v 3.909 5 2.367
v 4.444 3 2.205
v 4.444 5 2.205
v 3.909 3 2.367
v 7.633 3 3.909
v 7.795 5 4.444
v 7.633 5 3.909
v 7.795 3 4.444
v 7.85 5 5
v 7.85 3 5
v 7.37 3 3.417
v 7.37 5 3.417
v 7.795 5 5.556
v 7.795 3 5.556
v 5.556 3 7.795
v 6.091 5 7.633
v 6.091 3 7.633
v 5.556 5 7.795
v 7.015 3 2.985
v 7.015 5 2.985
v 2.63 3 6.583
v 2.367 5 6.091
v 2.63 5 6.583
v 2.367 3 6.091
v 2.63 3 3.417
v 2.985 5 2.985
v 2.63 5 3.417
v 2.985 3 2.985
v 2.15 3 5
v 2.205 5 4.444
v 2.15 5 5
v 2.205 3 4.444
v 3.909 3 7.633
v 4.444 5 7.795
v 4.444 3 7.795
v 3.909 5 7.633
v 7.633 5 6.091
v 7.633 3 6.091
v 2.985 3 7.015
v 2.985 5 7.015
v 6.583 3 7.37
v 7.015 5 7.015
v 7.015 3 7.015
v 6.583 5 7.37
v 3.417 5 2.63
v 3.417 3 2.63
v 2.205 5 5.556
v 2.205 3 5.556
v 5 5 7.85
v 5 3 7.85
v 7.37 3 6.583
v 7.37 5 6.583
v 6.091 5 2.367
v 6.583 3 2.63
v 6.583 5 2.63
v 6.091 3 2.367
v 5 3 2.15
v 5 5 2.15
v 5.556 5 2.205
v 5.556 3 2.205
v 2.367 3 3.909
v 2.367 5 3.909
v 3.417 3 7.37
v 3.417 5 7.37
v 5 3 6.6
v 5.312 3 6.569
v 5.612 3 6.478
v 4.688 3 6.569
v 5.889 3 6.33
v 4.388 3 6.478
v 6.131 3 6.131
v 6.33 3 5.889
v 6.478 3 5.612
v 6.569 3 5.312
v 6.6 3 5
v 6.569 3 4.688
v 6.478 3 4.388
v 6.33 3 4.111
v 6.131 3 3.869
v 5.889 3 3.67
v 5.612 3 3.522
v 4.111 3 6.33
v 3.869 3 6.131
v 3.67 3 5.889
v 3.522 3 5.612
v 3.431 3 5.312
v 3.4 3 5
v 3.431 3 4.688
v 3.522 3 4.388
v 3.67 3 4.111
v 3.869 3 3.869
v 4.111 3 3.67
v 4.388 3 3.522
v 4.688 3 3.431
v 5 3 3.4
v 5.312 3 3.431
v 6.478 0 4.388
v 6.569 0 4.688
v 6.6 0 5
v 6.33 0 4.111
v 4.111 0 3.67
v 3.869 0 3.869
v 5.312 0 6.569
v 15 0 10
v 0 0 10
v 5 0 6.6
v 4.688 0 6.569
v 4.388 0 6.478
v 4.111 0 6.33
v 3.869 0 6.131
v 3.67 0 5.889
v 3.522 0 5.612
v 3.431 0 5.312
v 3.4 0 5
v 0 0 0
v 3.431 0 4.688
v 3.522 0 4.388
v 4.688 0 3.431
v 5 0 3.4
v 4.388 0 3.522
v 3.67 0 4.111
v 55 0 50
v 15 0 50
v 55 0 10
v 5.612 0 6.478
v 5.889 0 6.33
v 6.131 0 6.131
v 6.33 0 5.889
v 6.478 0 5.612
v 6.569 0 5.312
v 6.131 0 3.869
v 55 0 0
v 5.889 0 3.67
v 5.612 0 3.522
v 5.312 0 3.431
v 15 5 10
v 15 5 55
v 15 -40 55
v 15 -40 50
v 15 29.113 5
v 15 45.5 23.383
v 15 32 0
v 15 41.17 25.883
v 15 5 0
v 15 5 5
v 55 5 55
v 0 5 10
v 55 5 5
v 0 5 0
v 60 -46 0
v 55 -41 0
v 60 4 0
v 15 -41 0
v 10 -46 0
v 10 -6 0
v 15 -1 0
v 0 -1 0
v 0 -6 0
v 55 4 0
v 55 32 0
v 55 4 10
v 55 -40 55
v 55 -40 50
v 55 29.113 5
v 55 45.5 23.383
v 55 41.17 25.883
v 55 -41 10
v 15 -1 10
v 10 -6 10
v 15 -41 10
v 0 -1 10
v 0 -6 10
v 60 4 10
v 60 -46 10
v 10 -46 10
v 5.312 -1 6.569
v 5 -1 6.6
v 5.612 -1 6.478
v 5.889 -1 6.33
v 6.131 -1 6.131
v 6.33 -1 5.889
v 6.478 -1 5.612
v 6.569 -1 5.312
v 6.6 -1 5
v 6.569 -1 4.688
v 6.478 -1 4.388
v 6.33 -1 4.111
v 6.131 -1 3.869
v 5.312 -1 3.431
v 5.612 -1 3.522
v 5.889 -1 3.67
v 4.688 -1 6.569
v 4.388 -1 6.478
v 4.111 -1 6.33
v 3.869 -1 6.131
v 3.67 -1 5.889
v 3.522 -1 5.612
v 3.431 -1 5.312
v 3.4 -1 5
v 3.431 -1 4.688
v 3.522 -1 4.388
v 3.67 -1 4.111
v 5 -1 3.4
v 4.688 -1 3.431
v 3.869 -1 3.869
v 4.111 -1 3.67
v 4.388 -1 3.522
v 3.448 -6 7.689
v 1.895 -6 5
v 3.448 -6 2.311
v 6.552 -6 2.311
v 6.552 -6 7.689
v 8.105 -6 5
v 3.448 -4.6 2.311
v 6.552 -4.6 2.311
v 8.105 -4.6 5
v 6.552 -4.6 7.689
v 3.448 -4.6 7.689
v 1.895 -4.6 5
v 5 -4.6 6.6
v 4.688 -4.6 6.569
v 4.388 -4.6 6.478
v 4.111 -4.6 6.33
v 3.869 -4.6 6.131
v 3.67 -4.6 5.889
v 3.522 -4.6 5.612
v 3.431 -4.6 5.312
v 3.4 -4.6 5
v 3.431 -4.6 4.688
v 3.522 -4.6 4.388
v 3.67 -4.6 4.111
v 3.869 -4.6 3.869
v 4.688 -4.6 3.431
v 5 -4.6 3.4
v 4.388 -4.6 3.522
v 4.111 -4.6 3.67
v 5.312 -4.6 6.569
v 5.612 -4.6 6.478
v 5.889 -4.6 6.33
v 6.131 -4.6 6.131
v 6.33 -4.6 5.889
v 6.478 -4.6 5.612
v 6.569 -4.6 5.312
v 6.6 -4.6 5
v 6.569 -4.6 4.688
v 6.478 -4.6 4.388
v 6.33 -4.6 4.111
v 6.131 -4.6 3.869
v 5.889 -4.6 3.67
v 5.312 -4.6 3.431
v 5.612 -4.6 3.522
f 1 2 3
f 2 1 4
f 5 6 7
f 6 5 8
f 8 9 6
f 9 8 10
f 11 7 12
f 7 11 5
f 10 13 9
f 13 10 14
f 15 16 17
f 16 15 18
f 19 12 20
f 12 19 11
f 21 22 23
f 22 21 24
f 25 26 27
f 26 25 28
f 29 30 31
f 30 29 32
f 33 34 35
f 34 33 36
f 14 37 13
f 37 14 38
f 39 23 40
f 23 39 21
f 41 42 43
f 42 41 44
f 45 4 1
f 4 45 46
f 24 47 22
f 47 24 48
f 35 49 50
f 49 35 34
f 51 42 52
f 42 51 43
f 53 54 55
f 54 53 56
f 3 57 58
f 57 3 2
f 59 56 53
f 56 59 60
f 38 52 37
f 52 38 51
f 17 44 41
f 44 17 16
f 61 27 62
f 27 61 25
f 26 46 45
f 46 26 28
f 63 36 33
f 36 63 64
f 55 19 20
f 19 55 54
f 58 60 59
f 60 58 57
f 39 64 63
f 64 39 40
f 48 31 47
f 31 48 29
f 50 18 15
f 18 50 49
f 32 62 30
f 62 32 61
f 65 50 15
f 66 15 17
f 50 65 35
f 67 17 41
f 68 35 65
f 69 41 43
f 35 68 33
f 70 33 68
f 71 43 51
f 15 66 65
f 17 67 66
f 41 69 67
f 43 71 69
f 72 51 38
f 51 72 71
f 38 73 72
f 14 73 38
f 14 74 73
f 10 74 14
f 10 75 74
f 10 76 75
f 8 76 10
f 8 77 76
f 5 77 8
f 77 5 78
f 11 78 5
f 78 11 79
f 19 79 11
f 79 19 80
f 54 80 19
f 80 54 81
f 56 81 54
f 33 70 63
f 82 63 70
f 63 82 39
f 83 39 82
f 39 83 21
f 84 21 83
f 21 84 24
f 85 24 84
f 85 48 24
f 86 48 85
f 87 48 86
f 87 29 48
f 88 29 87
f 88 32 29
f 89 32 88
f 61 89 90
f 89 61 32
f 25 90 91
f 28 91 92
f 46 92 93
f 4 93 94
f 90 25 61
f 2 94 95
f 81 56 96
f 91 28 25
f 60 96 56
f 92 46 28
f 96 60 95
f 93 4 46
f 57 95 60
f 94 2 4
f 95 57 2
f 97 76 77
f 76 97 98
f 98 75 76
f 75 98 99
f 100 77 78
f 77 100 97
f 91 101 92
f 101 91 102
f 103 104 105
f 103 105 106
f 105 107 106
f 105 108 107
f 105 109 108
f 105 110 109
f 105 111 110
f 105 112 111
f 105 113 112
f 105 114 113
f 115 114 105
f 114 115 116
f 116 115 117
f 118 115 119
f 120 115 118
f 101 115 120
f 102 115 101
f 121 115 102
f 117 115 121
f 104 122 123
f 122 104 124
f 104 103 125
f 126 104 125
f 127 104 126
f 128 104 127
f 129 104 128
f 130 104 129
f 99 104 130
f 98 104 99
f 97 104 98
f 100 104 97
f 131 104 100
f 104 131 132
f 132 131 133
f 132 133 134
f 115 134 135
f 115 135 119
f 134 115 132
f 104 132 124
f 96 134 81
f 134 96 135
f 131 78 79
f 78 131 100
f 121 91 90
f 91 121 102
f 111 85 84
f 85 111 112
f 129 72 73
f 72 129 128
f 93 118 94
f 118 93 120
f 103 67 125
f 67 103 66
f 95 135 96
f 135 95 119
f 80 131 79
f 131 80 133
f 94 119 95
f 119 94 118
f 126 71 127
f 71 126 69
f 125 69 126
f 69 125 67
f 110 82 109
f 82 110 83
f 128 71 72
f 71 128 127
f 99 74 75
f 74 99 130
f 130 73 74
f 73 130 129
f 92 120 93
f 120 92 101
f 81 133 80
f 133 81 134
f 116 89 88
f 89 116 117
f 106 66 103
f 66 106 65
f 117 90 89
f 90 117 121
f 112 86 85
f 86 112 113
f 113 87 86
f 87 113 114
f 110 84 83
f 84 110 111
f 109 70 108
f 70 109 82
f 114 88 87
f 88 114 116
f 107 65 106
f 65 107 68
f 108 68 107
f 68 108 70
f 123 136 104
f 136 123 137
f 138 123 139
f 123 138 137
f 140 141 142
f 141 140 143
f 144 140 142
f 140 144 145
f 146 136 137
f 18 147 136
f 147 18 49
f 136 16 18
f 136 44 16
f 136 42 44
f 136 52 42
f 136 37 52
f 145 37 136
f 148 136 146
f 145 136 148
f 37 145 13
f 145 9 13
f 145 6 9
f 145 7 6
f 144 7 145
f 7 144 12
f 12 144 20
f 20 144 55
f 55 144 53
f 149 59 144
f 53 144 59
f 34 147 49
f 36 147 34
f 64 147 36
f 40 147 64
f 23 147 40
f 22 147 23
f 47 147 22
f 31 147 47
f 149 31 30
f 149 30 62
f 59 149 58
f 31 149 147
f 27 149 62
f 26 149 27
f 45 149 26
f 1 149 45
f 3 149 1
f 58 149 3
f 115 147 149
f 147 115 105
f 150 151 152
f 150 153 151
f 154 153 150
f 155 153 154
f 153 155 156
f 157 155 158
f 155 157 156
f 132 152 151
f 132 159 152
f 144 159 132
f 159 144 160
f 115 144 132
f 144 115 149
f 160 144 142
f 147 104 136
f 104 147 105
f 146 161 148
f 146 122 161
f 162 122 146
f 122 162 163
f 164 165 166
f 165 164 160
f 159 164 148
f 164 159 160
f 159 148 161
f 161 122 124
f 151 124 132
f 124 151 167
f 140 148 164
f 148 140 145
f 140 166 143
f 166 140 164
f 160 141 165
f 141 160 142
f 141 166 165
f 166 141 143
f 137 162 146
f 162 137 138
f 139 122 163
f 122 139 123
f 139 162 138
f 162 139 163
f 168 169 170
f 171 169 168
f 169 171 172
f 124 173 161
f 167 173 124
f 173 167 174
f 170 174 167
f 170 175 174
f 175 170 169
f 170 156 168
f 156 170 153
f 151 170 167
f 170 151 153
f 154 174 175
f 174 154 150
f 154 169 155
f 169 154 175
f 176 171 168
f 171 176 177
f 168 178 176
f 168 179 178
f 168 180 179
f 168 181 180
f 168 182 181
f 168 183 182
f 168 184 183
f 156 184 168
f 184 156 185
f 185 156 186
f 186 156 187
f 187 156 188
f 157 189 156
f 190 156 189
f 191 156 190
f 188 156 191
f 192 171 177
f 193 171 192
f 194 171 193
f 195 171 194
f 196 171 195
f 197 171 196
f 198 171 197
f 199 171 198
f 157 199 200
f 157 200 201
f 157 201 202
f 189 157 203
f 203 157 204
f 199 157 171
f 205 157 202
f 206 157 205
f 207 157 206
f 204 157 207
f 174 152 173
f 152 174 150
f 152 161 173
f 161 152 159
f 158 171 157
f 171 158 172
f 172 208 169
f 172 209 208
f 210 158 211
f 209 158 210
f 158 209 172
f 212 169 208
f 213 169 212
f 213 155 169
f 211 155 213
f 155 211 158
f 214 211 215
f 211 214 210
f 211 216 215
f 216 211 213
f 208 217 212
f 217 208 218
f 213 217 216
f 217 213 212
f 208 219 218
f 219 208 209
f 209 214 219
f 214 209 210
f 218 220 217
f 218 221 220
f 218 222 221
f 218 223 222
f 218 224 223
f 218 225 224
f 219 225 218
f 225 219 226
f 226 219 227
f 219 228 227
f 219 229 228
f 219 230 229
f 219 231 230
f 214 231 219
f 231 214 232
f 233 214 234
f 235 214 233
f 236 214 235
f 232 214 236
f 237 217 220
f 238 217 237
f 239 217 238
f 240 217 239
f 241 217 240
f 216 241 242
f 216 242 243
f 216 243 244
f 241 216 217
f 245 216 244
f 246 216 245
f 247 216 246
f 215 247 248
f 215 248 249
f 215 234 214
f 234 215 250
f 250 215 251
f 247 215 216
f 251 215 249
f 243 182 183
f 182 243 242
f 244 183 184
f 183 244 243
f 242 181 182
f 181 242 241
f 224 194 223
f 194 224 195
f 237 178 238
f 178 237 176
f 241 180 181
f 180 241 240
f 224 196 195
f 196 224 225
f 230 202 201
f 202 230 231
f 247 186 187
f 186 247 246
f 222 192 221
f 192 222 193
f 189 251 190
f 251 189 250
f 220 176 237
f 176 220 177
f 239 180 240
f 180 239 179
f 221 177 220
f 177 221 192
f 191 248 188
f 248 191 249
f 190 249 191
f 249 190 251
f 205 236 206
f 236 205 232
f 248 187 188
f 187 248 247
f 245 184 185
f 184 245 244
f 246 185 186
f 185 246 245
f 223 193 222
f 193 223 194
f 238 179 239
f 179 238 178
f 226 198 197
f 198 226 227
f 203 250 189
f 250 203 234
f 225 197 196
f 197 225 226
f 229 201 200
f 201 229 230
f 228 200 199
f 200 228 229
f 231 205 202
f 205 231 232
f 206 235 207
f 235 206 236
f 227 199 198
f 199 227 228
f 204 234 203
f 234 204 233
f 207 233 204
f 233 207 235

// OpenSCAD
// file: ../common/din/base.scad
DIN_TOLERANCE = 0.1;

module din_help(name, _STD_TABLE) {
    echo("-----------------------------");
    echo(str("Size indexes for ", name));
    for(idx=[0:len(_STD_TABLE)-1]) {
        echo(str(idx, " = M", _STD_TABLE[idx][0]));
    }
    echo("-----------------------------");
}

module din_cutout_base(inner, outer, cap_height, height, fn) {
    translate([0, 0, height]) {
        mirror([0, 0, 1]) {
            cylinder(r=outer/2 + DIN_TOLERANCE, h=cap_height, center=false, $fn = fn);
            cylinder(r=inner/2 + DIN_TOLERANCE, h=height, center=false, $fn = 32);
        }
    }
}

module hex_nut(inner, outer, cap_height, height = 0) {
    din_cutout_base(inner, outer, cap_height, height, 6);
}

module round_bolt(inner, outer, cap_height, height = 0) {
    din_cutout_base(inner, outer, cap_height, height, 32);
}

translate([-10, 0, 0]) round_bolt(inner = 3, outer = 6.01, cap_height = 2.4, height = 10);
translate([10, 0, 0]) hex_nut(inner = 3, outer = 6.01, cap_height = 2.4, height = 10);
// file: ../common/din/din912.scad
use <./base.scad>
/*
    format: [size, diameter, cap_height]
            [d1, d2, k]
*/
_DIN_912_STD = [[2,3.8,2],[3,5.5,3],[4,7,4],[5,8.5,5],[6,10,6],[8,13,8],[10,16,10],[12,18,12],[14,21,14],[16,24,16],[18,27,18],[20,30,20],[24,36,24],[27,40,27],[30,45,30],[36,54,36]];

module din912_help() {
    din_help("DIN 912", _DIN_912_STD);
}

module din912_base(m_idx, height) {
    row = _DIN_912_STD[m_idx];
    inner = row[0];
    outer = row[1];
    cap_height = row[2];
    round_bolt(inner, outer, cap_height, height);
}

module din912(m_idx, height, coords) {
    difference() {
        children();
        for(i=[0:len(coords) - 1]) {
            translate([coords[i][0], coords[i][1], 0])
                din912_base(m_idx, height);
        }
    }
}

din912_help();

/*
din912(1, 10, [[5, 5]]) {
    cube([10, 10, 10]);
}
*/
// file: ../common/din/din934.scad
use <./base.scad>
/*
    format: [size, diameter, cap_height]
            [d1, e, m]
*/
_DIN_934_STD = [[1,2.72,0.8],[1.2,3.29,1],[1.4,3.29,1.2],[1.6,3.48,1.3],[1.7,3.82,1.4],[2,4.32,1.6],[2.3,4.95,1.8],[2.5,5.45,2],[2.6,5.51,2],[3,6.01,2.4],[3.5,6.01,2.8],[4,7.66,3.2],[5,8.76,4],[6,11.05,5],[7,12.12,5.5],[8,14.38,6.5],[10,18.9,8],[12,21.1,10],[14,24.49,11],[16,26.75,13],[18,29.56,15],[20,32.95,16],[22,35.03,18],[24,39.55,19],[27,45.2,22],[30,50.85,24],[33,55.37,26],[36,60.79,29],[39,66.44,31],[42,71.3,34],[45,76.95,36],[48,82.6,38],[52,88.25,42],[56,95.07,45],[60,100.72,48],[64,106.37,51],[68,112.02,54],[72,117.67,58],[76,123.32,61],[80,128.97,64],[85,133.11,68],[90,145.77,72],[95,151.42,76],[100,162.72,80],[105,16837,84],[110,174.02,88],[115,185.32,92],[120,190.97,96],[125,202.27,100],[130,207.75,104],[135,213.4,108],[140,224.7,112],[145,236,116],[150,236,120]];

module din934_help() {
    din_help("DIN 934", _DIN_934_STD);
}

module din934_base(m_idx, height) {
    row = _DIN_934_STD[m_idx];
    inner = row[0];
    outer = row[1];
    cap_height = row[2];
    hex_nut(inner, outer, cap_height, height);
}

module din934(m_idx, height, coords) {
    difference() {
        children();
        for(i=[0:len(coords) - 1]) {
            translate([coords[i][0], coords[i][1], 0])
                din934_base(m_idx, height);
        }
    }
}

din934_help();

/*
din934(9, 10, [[5, 5]]) {
    cube([10, 10, 10]);
}
*/
// main file
include <../common/din/din934.scad>
include <../common/din/din912.scad>

leg_side = 40;

thickness = 5;

headphone_side = 27;

back_joint_height = 10;

ear_size = 10;

front_height = 50;

module hook() {
    hook_width = leg_side;
    translate([0, headphone_side, 0]) {
        translate([0, -headphone_side, 0])
            cube([hook_width, headphone_side, thickness]);
        rotate([60, 0, 0])
            cube([hook_width, headphone_side, thickness]);
    }
}

module back_joint_base() {
    translate([ear_size, 0, 0]) {
        translate([thickness, 0, 0]) {
            cube([leg_side, thickness, back_joint_height]);
            rotate([0, 0, 90]) cube([leg_side + thickness, thickness, back_joint_height]);
            translate([leg_side + thickness, 0, 0]) rotate([0, 0, 90]) cube([leg_side + thickness * 2, thickness, back_joint_height]);
        }
        translate([-ear_size, leg_side, 0]) cube([ear_size, thickness, back_joint_height]);
        /* translate([leg_side + thickness * 2, leg_side, 0]) cube([ear_size, thickness, back_joint_height]); */
    }
}

module back_joint() {
    coords = [
        [5, 5],
        [ear_size + thickness * 2 + leg_side + 5, 5]
    ];

    rotate([90, 0, 0])
        translate([0, 0, - (leg_side + thickness)])
            din934(9, thickness + 1, coords)
                translate([0, 0, leg_side + thickness])
                    rotate([-90, 0, 0])
                        back_joint_base();
}

module front_ear() {
    translate([0, 0, back_joint_height])
        rotate([-90, 0, 0])
            din912(1, thickness + 1, [[5, 5]])
                cube([ear_size + thickness, back_joint_height, thickness]);
}

module front() {
    translate([ear_size + thickness, 0, 0])
        cube([leg_side, thickness, front_height + thickness]);

    front_ear();

    translate([ear_size + thickness, -leg_side, front_height])
        cube([leg_side, leg_side, thickness]);

    translate([ear_size + thickness, thickness, 0]) hook();
}

front();

translate([0, -(leg_side + thickness) - 1, 0]) back_joint();
